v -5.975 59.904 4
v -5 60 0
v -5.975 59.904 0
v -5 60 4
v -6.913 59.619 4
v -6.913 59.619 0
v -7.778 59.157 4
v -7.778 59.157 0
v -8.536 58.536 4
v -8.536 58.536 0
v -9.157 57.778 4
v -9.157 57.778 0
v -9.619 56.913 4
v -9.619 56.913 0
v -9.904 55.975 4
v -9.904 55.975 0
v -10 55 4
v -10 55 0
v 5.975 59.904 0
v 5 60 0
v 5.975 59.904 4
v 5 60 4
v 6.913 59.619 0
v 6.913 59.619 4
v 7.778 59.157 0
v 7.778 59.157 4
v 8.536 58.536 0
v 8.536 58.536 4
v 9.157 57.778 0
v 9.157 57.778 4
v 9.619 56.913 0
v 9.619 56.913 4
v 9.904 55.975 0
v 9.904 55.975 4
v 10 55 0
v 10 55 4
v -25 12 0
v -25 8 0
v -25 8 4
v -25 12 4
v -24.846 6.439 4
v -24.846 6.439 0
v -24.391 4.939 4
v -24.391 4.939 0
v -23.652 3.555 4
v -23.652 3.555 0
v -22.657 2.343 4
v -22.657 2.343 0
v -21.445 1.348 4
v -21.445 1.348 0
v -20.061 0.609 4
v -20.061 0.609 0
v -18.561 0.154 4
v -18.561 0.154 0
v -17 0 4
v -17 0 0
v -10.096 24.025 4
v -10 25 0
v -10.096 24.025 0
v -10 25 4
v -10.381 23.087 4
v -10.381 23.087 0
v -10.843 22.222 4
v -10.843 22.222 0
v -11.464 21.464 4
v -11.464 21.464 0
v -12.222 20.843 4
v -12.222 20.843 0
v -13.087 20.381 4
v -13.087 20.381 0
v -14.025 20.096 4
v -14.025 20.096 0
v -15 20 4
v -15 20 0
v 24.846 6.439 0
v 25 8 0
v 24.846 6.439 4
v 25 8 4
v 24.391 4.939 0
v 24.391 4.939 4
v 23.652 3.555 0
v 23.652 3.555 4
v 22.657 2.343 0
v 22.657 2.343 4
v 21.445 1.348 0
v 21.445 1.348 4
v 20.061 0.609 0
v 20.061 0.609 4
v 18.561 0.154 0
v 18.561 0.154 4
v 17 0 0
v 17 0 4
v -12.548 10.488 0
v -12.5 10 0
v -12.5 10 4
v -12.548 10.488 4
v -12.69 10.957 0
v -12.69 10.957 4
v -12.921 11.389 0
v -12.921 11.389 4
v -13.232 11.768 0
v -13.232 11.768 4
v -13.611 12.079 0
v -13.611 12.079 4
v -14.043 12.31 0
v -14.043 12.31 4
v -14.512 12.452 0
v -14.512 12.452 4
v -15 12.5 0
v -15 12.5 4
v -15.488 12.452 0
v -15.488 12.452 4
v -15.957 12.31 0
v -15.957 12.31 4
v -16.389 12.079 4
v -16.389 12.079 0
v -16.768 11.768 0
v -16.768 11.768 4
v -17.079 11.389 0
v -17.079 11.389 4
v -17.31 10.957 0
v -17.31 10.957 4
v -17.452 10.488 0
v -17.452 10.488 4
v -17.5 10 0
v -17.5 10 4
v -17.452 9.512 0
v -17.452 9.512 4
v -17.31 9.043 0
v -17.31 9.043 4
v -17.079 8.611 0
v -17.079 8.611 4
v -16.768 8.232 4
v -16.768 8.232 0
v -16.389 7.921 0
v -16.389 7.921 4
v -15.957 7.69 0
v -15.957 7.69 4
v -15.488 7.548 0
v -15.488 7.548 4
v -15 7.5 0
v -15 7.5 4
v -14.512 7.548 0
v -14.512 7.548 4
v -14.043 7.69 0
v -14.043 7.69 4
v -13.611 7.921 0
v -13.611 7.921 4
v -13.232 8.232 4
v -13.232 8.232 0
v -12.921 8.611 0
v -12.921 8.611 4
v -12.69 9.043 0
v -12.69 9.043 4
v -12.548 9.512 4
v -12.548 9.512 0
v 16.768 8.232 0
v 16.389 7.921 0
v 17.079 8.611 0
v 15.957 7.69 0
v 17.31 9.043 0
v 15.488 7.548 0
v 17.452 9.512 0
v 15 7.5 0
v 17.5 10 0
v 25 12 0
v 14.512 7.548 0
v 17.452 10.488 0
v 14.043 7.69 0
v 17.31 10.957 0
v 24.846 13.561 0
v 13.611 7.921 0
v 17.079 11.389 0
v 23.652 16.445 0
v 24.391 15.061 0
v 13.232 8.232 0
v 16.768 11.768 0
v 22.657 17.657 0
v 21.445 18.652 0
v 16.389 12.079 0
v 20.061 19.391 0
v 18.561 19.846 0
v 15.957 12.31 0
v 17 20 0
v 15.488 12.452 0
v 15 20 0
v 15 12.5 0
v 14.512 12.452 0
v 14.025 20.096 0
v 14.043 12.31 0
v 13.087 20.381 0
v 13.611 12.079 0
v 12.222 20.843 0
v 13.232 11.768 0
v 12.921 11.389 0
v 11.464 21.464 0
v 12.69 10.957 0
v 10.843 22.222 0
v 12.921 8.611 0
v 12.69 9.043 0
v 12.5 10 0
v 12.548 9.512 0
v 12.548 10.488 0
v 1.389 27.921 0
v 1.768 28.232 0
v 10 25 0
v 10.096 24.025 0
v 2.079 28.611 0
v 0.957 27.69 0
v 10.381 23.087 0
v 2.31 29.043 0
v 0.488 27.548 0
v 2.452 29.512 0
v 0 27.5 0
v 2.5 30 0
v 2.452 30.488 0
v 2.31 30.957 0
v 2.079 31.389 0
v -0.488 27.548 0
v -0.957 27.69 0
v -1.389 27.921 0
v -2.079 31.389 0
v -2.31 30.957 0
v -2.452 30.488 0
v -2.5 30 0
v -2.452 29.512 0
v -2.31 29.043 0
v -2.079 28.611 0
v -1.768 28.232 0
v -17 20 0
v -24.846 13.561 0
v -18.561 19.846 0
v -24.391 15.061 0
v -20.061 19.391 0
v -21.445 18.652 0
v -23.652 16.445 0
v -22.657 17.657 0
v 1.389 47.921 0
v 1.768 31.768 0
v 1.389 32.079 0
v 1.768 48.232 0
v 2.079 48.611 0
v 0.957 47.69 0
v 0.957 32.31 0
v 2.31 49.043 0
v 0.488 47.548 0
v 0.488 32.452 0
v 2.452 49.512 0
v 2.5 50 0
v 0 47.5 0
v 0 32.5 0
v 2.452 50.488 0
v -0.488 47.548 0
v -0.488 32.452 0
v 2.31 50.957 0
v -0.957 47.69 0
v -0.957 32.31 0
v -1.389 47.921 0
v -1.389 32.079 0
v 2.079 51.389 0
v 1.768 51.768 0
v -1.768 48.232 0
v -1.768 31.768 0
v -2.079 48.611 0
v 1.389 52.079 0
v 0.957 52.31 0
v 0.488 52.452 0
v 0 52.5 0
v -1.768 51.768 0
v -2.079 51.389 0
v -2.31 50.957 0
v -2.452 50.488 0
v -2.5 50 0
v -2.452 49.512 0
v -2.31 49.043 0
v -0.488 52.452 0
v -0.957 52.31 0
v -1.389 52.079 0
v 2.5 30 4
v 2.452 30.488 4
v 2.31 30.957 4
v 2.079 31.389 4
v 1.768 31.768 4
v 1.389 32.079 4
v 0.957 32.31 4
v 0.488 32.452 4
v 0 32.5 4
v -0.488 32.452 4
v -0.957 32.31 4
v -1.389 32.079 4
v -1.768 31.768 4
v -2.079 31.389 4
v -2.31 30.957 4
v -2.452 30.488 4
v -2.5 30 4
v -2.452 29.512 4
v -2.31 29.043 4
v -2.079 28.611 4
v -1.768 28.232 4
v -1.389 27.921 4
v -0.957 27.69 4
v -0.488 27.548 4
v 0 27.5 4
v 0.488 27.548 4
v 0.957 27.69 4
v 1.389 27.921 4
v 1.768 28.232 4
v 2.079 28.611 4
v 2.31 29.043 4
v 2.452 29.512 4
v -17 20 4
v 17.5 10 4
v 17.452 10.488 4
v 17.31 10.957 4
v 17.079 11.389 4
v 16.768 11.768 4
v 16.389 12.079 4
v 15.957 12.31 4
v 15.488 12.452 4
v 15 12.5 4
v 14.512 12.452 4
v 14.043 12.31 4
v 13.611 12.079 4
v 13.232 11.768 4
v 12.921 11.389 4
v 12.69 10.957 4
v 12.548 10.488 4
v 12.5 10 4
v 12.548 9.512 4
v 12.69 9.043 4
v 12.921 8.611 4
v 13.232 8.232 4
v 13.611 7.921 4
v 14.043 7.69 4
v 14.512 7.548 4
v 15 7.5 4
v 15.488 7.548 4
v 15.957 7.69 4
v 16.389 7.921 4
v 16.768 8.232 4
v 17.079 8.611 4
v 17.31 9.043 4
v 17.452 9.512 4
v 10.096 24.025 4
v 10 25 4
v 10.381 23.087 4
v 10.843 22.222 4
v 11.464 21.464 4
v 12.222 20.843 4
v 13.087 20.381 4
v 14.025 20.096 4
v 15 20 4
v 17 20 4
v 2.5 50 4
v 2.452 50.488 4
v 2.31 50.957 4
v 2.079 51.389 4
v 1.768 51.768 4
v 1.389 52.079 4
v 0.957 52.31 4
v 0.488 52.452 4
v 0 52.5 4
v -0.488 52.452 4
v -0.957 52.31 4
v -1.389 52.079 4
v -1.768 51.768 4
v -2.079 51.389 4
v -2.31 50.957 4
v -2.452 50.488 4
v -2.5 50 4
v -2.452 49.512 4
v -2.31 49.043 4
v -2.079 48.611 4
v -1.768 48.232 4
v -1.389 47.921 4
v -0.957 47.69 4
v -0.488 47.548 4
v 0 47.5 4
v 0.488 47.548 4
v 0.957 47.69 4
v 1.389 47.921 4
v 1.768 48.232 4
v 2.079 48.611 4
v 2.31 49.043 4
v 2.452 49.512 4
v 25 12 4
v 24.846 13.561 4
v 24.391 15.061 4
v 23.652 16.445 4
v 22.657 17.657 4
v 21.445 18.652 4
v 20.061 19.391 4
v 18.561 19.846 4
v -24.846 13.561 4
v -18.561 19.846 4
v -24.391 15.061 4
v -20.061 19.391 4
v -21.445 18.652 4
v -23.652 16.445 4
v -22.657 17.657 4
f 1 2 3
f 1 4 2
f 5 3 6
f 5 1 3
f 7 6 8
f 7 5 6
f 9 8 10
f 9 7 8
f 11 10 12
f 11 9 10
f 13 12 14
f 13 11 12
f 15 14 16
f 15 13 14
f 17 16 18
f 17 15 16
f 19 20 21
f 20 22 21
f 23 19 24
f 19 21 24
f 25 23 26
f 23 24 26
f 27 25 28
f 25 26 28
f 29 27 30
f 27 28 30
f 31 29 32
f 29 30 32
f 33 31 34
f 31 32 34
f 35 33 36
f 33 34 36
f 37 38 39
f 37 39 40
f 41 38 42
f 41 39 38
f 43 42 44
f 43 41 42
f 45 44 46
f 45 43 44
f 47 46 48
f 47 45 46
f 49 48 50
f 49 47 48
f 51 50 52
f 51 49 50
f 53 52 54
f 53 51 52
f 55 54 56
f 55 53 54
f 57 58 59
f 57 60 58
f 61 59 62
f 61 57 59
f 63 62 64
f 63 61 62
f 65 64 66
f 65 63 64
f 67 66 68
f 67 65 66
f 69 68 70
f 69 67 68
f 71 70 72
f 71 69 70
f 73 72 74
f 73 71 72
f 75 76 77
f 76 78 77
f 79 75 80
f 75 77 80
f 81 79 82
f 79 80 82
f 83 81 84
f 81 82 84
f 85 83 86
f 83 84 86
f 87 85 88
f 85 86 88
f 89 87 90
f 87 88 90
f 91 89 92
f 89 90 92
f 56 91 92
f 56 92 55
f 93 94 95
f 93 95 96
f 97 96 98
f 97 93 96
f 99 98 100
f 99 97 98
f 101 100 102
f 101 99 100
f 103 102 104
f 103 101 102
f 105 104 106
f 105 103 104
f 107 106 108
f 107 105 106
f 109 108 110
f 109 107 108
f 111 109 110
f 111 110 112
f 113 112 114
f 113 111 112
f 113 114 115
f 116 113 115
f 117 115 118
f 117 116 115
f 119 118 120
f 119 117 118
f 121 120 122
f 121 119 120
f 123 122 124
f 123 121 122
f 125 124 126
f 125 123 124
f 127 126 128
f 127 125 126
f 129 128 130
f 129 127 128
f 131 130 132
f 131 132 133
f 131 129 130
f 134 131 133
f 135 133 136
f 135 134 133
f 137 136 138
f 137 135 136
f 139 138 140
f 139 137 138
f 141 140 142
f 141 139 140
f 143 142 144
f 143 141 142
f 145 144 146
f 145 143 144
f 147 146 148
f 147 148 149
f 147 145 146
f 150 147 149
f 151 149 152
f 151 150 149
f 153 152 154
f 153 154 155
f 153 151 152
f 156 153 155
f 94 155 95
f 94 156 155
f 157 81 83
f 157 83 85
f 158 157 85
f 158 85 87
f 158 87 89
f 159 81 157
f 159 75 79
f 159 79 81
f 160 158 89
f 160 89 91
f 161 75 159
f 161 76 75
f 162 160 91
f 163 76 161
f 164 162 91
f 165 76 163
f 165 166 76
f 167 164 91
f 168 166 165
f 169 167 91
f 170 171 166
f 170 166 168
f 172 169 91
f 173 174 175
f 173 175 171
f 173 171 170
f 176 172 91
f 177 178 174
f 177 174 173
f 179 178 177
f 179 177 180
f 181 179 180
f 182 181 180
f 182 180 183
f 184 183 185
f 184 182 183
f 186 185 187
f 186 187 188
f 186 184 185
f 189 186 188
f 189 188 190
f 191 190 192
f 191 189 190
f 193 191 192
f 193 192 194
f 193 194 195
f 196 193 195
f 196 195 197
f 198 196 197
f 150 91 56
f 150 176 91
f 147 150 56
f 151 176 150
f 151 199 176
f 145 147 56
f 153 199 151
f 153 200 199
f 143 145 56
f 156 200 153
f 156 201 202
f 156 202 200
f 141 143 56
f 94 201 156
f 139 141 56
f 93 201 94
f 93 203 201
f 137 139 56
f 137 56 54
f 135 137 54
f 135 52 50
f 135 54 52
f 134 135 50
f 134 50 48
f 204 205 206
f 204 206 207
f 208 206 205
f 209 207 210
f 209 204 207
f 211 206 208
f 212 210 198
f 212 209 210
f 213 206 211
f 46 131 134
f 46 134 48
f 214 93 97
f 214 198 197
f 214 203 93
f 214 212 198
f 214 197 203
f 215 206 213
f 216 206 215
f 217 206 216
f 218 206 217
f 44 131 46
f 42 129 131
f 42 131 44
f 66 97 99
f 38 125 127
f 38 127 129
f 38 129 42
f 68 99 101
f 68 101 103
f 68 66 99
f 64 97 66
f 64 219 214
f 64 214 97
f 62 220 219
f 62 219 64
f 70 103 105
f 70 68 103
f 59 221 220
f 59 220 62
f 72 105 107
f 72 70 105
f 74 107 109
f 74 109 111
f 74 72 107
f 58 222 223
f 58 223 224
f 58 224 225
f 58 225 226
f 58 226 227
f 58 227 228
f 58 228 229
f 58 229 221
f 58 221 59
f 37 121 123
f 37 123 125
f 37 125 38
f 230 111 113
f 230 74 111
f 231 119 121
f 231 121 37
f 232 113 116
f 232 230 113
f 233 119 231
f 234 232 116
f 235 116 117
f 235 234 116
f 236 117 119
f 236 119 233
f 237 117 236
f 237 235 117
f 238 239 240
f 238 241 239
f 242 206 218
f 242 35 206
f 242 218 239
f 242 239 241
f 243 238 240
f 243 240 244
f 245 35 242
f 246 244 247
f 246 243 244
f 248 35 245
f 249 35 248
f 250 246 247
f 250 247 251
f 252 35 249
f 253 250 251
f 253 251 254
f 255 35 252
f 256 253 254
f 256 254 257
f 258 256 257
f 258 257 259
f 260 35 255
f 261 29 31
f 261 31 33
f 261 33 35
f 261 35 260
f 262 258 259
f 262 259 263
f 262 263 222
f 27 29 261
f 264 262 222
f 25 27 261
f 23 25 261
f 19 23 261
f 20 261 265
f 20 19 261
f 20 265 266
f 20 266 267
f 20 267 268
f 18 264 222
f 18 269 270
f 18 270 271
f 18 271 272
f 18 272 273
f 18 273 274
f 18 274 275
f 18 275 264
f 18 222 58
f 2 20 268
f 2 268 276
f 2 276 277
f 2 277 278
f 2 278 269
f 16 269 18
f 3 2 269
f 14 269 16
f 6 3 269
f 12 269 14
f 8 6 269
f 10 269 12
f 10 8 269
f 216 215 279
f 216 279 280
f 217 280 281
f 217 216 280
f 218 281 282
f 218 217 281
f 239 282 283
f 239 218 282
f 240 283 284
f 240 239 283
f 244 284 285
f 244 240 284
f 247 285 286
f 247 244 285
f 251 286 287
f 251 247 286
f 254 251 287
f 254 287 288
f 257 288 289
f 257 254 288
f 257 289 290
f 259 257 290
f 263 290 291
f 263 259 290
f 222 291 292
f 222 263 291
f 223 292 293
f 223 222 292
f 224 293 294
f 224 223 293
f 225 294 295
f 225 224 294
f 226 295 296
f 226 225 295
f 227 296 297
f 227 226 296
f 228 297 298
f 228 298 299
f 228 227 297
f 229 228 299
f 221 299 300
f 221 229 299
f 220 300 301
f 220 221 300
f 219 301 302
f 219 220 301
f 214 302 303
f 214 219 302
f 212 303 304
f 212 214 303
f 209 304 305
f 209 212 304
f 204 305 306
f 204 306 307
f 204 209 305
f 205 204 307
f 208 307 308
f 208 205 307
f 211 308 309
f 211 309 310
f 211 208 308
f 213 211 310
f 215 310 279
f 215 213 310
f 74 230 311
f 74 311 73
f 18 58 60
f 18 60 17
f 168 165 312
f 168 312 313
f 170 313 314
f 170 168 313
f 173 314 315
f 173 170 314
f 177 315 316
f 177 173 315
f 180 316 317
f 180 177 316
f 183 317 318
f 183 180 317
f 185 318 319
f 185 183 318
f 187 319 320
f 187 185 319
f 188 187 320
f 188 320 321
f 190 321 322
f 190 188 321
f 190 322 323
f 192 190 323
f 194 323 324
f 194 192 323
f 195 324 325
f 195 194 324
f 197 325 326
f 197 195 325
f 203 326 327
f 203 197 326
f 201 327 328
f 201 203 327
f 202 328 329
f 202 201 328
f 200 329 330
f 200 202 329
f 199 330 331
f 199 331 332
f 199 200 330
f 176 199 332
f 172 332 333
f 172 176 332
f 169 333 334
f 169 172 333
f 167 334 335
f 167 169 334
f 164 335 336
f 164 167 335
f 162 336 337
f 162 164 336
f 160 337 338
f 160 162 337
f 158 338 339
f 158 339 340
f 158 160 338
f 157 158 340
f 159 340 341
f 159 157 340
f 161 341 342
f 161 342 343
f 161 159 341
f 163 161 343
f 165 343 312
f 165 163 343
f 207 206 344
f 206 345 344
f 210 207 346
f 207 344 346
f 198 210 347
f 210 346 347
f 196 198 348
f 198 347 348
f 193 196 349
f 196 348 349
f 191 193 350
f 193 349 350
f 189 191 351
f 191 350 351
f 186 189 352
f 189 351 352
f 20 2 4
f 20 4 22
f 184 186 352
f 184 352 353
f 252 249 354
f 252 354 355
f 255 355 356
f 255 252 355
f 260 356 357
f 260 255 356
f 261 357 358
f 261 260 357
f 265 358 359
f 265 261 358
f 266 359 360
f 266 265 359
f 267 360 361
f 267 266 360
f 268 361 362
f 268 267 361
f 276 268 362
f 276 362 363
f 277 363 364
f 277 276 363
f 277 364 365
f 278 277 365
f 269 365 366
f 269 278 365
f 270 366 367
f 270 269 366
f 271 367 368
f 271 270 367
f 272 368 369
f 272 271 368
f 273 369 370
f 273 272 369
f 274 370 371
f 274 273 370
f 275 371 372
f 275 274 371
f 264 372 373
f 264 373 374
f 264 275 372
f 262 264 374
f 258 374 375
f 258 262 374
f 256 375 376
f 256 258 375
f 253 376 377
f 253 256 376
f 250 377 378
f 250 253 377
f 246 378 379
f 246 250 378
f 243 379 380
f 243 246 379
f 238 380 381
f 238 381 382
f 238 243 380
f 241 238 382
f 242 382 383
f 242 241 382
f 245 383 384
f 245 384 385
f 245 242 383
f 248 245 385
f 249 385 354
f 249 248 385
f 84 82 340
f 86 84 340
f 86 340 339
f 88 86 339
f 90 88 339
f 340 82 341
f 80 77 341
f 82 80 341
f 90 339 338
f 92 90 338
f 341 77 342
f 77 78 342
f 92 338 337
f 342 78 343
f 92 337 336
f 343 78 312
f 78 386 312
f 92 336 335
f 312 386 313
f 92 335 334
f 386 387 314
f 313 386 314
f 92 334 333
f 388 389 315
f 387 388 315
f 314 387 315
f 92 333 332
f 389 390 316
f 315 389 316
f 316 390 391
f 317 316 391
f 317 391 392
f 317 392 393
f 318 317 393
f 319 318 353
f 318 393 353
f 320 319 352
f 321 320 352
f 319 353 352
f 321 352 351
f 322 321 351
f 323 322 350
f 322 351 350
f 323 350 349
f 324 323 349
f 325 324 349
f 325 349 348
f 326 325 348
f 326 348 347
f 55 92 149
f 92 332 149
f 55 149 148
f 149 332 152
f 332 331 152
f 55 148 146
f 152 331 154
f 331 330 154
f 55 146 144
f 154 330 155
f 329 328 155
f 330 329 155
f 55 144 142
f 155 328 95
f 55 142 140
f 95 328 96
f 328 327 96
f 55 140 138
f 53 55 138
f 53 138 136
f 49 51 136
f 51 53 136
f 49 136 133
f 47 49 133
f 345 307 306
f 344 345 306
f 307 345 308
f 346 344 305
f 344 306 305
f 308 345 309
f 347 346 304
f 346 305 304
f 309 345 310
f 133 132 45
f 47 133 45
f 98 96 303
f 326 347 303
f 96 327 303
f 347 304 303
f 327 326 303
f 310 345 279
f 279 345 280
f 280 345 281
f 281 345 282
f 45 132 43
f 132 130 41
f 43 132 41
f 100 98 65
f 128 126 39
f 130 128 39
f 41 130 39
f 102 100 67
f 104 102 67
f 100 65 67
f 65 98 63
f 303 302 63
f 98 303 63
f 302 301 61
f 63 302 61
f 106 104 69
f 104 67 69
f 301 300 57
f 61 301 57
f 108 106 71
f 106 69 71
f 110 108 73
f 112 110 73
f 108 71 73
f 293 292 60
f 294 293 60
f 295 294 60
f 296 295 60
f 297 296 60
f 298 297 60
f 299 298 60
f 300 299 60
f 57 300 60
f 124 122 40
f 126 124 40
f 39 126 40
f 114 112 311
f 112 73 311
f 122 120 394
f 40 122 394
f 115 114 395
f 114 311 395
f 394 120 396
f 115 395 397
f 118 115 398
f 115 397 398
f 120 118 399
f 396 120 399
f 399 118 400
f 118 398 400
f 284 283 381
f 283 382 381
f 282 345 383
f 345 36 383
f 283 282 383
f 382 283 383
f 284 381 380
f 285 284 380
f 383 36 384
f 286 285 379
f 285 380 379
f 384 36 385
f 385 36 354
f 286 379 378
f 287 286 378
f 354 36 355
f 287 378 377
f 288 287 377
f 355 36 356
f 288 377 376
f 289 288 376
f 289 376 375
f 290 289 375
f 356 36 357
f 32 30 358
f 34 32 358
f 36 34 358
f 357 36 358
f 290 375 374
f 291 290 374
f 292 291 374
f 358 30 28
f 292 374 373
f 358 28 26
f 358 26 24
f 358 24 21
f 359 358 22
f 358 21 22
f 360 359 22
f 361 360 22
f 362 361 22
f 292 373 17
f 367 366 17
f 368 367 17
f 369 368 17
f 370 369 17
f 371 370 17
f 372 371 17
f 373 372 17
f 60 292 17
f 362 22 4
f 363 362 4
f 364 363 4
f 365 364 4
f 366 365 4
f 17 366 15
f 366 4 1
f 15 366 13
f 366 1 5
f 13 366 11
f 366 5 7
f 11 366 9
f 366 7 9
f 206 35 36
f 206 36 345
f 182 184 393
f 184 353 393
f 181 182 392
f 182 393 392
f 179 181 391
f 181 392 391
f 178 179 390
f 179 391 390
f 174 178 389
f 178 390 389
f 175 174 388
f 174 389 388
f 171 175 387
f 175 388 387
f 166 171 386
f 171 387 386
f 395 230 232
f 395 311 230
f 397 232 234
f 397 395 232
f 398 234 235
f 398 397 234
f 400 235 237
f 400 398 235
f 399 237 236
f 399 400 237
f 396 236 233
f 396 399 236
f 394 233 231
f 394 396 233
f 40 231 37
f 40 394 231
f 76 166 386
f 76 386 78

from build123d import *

# Parameters (mm, degrees)
SKETCH1_R           = 2.5
BOSS_EXTRUDE1_DEPTH = 4
FILLET1_R           = 5
FILLET2_R           = 8


with BuildPart() as part:
    # Sketch1 → Boss-Extrude1 (new body)
    with BuildSketch(Plane.XY):
        Polygon((-10, 60), (10, 60), (10, 20), (25, 20), (25, 0), (-25, 0), (-25, 20), (-10, 20), align=None)
        with Locations((0, 50)):
            Circle(SKETCH1_R, mode=Mode.SUBTRACT)
        with Locations((0, 30)):
            Circle(SKETCH1_R, mode=Mode.SUBTRACT)
        with Locations((15, 10)):
            Circle(SKETCH1_R, mode=Mode.SUBTRACT)
        with Locations((-15, 10)):
            Circle(SKETCH1_R, mode=Mode.SUBTRACT)
    extrude(amount=BOSS_EXTRUDE1_DEPTH)

    # Fillet1
    fillet1_edges = [part.edges().sort_by_distance(p)[0] for p in [
        (-10, 20, 2),
        (-10, 60, 2),
        (10, 60, 2),
        (10, 20, 2),
    ]]
    fillet(fillet1_edges, radius=FILLET1_R)

    # Fillet2
    fillet2_edges = [part.edges().sort_by_distance(p)[0] for p in [
        (25, 0, 2),
        (-25, 0, 2),
        (-25, 20, 2),
        (25, 20, 2),
    ]]
    fillet(fillet2_edges, radius=FILLET2_R)


solid = part.part
